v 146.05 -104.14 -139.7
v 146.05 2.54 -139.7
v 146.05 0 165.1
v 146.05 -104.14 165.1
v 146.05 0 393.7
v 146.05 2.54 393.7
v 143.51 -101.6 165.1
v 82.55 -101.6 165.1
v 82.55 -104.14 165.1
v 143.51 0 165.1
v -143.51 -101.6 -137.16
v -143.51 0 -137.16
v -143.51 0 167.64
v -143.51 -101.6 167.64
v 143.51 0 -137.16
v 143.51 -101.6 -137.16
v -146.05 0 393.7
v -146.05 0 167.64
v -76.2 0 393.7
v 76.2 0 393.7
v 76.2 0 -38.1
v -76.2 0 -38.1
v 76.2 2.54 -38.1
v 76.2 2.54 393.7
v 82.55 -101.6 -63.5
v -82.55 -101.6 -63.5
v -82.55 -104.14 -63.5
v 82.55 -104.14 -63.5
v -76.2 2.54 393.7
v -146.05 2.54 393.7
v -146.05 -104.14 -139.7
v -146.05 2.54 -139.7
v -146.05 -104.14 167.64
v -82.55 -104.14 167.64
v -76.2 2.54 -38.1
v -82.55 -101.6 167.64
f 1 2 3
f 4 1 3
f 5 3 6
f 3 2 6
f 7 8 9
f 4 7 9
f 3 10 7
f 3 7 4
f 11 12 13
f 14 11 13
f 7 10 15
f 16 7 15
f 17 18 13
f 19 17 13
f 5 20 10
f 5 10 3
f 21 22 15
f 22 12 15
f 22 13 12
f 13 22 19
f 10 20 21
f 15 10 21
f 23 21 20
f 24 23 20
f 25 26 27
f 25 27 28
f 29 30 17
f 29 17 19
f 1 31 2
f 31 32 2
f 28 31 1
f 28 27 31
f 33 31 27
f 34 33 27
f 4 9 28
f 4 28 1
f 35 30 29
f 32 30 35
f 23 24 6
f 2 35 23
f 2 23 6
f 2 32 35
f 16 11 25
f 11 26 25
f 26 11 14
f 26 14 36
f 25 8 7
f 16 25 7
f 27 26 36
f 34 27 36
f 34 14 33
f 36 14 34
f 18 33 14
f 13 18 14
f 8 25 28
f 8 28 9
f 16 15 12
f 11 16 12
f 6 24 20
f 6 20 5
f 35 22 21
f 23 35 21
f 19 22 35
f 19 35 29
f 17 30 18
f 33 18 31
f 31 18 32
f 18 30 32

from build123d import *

# Parameters (mm, degrees)
F0_W      = 292.1
F0_H      = 279.4
F1_DEPTH  = 2.54
F4_DEPTH  = 101.6
F5_W      = 63.5
F5_H      = 231.14
F5_H_2    = 76.2
F5_W_2    = 165.1
F5_H_3    = 228.6
F6_DEPTH  = 2.54
F7_W      = 292.1
F7_H      = 2.54
F8_DEPTH  = 25.4
F9_W      = 152.4
F9_H      = 431.8
F10_DEPTH = 25.4


with BuildPart() as f1:
    # F0 (on Front) → F1 (new body)
    with BuildSketch(Plane.XZ):
        Rectangle(F0_W, F0_H)
    extrude(amount=-F1_DEPTH)

    # F2: F1 across face


with BuildPart() as f1_1:
    add(f1.part)
    add(f1.part.mirror(Plane(origin=(0, 1.27, 139.7), x_dir=(1, 0, 0), z_dir=(0, 0, 1))))

    # F3 (on face) → F4 (join)
    with BuildSketch(Plane.XZ):
        Polygon((-143.51, -137.16), (-143.51, 167.64), (-146.05, 167.64), (-146.05, -139.7), (146.05, -139.7), (146.05, 165.1), (143.51, 165.1), (143.51, -137.16), align=None)
    extrude(amount=F4_DEPTH)

    # F5 (on face) → F6 (join)
    with BuildSketch(Plane.XZ.offset(101.6)):
        with Locations((-114.3, 52.07)):
            Rectangle(F5_W, F5_H)
        with Locations((-114.3, -101.6)):
            Rectangle(F5_W, F5_H_2)
        with Locations((0, -101.6)):
            Rectangle(F5_W_2, F5_H_2)
        with Locations((114.3, 50.8)):
            Rectangle(F5_W, F5_H_3)
        with Locations((114.3, -101.6)):
            Rectangle(F5_W, F5_H_2)
    extrude(amount=F6_DEPTH)

    # F7 (on face) → F8 (cut)
    with BuildSketch(Plane.XY.offset(419.1)):
        with Locations((0, 1.27)):
            Rectangle(F7_W, F7_H)
    extrude(amount=-F8_DEPTH, mode=Mode.SUBTRACT)

    # F9 (on face) → F10 (cut)
    with BuildSketch(Plane.XZ):
        with Locations((0, 177.8)):
            Rectangle(F9_W, F9_H)
    extrude(amount=-F10_DEPTH, mode=Mode.SUBTRACT)


solid = f1_1.part
